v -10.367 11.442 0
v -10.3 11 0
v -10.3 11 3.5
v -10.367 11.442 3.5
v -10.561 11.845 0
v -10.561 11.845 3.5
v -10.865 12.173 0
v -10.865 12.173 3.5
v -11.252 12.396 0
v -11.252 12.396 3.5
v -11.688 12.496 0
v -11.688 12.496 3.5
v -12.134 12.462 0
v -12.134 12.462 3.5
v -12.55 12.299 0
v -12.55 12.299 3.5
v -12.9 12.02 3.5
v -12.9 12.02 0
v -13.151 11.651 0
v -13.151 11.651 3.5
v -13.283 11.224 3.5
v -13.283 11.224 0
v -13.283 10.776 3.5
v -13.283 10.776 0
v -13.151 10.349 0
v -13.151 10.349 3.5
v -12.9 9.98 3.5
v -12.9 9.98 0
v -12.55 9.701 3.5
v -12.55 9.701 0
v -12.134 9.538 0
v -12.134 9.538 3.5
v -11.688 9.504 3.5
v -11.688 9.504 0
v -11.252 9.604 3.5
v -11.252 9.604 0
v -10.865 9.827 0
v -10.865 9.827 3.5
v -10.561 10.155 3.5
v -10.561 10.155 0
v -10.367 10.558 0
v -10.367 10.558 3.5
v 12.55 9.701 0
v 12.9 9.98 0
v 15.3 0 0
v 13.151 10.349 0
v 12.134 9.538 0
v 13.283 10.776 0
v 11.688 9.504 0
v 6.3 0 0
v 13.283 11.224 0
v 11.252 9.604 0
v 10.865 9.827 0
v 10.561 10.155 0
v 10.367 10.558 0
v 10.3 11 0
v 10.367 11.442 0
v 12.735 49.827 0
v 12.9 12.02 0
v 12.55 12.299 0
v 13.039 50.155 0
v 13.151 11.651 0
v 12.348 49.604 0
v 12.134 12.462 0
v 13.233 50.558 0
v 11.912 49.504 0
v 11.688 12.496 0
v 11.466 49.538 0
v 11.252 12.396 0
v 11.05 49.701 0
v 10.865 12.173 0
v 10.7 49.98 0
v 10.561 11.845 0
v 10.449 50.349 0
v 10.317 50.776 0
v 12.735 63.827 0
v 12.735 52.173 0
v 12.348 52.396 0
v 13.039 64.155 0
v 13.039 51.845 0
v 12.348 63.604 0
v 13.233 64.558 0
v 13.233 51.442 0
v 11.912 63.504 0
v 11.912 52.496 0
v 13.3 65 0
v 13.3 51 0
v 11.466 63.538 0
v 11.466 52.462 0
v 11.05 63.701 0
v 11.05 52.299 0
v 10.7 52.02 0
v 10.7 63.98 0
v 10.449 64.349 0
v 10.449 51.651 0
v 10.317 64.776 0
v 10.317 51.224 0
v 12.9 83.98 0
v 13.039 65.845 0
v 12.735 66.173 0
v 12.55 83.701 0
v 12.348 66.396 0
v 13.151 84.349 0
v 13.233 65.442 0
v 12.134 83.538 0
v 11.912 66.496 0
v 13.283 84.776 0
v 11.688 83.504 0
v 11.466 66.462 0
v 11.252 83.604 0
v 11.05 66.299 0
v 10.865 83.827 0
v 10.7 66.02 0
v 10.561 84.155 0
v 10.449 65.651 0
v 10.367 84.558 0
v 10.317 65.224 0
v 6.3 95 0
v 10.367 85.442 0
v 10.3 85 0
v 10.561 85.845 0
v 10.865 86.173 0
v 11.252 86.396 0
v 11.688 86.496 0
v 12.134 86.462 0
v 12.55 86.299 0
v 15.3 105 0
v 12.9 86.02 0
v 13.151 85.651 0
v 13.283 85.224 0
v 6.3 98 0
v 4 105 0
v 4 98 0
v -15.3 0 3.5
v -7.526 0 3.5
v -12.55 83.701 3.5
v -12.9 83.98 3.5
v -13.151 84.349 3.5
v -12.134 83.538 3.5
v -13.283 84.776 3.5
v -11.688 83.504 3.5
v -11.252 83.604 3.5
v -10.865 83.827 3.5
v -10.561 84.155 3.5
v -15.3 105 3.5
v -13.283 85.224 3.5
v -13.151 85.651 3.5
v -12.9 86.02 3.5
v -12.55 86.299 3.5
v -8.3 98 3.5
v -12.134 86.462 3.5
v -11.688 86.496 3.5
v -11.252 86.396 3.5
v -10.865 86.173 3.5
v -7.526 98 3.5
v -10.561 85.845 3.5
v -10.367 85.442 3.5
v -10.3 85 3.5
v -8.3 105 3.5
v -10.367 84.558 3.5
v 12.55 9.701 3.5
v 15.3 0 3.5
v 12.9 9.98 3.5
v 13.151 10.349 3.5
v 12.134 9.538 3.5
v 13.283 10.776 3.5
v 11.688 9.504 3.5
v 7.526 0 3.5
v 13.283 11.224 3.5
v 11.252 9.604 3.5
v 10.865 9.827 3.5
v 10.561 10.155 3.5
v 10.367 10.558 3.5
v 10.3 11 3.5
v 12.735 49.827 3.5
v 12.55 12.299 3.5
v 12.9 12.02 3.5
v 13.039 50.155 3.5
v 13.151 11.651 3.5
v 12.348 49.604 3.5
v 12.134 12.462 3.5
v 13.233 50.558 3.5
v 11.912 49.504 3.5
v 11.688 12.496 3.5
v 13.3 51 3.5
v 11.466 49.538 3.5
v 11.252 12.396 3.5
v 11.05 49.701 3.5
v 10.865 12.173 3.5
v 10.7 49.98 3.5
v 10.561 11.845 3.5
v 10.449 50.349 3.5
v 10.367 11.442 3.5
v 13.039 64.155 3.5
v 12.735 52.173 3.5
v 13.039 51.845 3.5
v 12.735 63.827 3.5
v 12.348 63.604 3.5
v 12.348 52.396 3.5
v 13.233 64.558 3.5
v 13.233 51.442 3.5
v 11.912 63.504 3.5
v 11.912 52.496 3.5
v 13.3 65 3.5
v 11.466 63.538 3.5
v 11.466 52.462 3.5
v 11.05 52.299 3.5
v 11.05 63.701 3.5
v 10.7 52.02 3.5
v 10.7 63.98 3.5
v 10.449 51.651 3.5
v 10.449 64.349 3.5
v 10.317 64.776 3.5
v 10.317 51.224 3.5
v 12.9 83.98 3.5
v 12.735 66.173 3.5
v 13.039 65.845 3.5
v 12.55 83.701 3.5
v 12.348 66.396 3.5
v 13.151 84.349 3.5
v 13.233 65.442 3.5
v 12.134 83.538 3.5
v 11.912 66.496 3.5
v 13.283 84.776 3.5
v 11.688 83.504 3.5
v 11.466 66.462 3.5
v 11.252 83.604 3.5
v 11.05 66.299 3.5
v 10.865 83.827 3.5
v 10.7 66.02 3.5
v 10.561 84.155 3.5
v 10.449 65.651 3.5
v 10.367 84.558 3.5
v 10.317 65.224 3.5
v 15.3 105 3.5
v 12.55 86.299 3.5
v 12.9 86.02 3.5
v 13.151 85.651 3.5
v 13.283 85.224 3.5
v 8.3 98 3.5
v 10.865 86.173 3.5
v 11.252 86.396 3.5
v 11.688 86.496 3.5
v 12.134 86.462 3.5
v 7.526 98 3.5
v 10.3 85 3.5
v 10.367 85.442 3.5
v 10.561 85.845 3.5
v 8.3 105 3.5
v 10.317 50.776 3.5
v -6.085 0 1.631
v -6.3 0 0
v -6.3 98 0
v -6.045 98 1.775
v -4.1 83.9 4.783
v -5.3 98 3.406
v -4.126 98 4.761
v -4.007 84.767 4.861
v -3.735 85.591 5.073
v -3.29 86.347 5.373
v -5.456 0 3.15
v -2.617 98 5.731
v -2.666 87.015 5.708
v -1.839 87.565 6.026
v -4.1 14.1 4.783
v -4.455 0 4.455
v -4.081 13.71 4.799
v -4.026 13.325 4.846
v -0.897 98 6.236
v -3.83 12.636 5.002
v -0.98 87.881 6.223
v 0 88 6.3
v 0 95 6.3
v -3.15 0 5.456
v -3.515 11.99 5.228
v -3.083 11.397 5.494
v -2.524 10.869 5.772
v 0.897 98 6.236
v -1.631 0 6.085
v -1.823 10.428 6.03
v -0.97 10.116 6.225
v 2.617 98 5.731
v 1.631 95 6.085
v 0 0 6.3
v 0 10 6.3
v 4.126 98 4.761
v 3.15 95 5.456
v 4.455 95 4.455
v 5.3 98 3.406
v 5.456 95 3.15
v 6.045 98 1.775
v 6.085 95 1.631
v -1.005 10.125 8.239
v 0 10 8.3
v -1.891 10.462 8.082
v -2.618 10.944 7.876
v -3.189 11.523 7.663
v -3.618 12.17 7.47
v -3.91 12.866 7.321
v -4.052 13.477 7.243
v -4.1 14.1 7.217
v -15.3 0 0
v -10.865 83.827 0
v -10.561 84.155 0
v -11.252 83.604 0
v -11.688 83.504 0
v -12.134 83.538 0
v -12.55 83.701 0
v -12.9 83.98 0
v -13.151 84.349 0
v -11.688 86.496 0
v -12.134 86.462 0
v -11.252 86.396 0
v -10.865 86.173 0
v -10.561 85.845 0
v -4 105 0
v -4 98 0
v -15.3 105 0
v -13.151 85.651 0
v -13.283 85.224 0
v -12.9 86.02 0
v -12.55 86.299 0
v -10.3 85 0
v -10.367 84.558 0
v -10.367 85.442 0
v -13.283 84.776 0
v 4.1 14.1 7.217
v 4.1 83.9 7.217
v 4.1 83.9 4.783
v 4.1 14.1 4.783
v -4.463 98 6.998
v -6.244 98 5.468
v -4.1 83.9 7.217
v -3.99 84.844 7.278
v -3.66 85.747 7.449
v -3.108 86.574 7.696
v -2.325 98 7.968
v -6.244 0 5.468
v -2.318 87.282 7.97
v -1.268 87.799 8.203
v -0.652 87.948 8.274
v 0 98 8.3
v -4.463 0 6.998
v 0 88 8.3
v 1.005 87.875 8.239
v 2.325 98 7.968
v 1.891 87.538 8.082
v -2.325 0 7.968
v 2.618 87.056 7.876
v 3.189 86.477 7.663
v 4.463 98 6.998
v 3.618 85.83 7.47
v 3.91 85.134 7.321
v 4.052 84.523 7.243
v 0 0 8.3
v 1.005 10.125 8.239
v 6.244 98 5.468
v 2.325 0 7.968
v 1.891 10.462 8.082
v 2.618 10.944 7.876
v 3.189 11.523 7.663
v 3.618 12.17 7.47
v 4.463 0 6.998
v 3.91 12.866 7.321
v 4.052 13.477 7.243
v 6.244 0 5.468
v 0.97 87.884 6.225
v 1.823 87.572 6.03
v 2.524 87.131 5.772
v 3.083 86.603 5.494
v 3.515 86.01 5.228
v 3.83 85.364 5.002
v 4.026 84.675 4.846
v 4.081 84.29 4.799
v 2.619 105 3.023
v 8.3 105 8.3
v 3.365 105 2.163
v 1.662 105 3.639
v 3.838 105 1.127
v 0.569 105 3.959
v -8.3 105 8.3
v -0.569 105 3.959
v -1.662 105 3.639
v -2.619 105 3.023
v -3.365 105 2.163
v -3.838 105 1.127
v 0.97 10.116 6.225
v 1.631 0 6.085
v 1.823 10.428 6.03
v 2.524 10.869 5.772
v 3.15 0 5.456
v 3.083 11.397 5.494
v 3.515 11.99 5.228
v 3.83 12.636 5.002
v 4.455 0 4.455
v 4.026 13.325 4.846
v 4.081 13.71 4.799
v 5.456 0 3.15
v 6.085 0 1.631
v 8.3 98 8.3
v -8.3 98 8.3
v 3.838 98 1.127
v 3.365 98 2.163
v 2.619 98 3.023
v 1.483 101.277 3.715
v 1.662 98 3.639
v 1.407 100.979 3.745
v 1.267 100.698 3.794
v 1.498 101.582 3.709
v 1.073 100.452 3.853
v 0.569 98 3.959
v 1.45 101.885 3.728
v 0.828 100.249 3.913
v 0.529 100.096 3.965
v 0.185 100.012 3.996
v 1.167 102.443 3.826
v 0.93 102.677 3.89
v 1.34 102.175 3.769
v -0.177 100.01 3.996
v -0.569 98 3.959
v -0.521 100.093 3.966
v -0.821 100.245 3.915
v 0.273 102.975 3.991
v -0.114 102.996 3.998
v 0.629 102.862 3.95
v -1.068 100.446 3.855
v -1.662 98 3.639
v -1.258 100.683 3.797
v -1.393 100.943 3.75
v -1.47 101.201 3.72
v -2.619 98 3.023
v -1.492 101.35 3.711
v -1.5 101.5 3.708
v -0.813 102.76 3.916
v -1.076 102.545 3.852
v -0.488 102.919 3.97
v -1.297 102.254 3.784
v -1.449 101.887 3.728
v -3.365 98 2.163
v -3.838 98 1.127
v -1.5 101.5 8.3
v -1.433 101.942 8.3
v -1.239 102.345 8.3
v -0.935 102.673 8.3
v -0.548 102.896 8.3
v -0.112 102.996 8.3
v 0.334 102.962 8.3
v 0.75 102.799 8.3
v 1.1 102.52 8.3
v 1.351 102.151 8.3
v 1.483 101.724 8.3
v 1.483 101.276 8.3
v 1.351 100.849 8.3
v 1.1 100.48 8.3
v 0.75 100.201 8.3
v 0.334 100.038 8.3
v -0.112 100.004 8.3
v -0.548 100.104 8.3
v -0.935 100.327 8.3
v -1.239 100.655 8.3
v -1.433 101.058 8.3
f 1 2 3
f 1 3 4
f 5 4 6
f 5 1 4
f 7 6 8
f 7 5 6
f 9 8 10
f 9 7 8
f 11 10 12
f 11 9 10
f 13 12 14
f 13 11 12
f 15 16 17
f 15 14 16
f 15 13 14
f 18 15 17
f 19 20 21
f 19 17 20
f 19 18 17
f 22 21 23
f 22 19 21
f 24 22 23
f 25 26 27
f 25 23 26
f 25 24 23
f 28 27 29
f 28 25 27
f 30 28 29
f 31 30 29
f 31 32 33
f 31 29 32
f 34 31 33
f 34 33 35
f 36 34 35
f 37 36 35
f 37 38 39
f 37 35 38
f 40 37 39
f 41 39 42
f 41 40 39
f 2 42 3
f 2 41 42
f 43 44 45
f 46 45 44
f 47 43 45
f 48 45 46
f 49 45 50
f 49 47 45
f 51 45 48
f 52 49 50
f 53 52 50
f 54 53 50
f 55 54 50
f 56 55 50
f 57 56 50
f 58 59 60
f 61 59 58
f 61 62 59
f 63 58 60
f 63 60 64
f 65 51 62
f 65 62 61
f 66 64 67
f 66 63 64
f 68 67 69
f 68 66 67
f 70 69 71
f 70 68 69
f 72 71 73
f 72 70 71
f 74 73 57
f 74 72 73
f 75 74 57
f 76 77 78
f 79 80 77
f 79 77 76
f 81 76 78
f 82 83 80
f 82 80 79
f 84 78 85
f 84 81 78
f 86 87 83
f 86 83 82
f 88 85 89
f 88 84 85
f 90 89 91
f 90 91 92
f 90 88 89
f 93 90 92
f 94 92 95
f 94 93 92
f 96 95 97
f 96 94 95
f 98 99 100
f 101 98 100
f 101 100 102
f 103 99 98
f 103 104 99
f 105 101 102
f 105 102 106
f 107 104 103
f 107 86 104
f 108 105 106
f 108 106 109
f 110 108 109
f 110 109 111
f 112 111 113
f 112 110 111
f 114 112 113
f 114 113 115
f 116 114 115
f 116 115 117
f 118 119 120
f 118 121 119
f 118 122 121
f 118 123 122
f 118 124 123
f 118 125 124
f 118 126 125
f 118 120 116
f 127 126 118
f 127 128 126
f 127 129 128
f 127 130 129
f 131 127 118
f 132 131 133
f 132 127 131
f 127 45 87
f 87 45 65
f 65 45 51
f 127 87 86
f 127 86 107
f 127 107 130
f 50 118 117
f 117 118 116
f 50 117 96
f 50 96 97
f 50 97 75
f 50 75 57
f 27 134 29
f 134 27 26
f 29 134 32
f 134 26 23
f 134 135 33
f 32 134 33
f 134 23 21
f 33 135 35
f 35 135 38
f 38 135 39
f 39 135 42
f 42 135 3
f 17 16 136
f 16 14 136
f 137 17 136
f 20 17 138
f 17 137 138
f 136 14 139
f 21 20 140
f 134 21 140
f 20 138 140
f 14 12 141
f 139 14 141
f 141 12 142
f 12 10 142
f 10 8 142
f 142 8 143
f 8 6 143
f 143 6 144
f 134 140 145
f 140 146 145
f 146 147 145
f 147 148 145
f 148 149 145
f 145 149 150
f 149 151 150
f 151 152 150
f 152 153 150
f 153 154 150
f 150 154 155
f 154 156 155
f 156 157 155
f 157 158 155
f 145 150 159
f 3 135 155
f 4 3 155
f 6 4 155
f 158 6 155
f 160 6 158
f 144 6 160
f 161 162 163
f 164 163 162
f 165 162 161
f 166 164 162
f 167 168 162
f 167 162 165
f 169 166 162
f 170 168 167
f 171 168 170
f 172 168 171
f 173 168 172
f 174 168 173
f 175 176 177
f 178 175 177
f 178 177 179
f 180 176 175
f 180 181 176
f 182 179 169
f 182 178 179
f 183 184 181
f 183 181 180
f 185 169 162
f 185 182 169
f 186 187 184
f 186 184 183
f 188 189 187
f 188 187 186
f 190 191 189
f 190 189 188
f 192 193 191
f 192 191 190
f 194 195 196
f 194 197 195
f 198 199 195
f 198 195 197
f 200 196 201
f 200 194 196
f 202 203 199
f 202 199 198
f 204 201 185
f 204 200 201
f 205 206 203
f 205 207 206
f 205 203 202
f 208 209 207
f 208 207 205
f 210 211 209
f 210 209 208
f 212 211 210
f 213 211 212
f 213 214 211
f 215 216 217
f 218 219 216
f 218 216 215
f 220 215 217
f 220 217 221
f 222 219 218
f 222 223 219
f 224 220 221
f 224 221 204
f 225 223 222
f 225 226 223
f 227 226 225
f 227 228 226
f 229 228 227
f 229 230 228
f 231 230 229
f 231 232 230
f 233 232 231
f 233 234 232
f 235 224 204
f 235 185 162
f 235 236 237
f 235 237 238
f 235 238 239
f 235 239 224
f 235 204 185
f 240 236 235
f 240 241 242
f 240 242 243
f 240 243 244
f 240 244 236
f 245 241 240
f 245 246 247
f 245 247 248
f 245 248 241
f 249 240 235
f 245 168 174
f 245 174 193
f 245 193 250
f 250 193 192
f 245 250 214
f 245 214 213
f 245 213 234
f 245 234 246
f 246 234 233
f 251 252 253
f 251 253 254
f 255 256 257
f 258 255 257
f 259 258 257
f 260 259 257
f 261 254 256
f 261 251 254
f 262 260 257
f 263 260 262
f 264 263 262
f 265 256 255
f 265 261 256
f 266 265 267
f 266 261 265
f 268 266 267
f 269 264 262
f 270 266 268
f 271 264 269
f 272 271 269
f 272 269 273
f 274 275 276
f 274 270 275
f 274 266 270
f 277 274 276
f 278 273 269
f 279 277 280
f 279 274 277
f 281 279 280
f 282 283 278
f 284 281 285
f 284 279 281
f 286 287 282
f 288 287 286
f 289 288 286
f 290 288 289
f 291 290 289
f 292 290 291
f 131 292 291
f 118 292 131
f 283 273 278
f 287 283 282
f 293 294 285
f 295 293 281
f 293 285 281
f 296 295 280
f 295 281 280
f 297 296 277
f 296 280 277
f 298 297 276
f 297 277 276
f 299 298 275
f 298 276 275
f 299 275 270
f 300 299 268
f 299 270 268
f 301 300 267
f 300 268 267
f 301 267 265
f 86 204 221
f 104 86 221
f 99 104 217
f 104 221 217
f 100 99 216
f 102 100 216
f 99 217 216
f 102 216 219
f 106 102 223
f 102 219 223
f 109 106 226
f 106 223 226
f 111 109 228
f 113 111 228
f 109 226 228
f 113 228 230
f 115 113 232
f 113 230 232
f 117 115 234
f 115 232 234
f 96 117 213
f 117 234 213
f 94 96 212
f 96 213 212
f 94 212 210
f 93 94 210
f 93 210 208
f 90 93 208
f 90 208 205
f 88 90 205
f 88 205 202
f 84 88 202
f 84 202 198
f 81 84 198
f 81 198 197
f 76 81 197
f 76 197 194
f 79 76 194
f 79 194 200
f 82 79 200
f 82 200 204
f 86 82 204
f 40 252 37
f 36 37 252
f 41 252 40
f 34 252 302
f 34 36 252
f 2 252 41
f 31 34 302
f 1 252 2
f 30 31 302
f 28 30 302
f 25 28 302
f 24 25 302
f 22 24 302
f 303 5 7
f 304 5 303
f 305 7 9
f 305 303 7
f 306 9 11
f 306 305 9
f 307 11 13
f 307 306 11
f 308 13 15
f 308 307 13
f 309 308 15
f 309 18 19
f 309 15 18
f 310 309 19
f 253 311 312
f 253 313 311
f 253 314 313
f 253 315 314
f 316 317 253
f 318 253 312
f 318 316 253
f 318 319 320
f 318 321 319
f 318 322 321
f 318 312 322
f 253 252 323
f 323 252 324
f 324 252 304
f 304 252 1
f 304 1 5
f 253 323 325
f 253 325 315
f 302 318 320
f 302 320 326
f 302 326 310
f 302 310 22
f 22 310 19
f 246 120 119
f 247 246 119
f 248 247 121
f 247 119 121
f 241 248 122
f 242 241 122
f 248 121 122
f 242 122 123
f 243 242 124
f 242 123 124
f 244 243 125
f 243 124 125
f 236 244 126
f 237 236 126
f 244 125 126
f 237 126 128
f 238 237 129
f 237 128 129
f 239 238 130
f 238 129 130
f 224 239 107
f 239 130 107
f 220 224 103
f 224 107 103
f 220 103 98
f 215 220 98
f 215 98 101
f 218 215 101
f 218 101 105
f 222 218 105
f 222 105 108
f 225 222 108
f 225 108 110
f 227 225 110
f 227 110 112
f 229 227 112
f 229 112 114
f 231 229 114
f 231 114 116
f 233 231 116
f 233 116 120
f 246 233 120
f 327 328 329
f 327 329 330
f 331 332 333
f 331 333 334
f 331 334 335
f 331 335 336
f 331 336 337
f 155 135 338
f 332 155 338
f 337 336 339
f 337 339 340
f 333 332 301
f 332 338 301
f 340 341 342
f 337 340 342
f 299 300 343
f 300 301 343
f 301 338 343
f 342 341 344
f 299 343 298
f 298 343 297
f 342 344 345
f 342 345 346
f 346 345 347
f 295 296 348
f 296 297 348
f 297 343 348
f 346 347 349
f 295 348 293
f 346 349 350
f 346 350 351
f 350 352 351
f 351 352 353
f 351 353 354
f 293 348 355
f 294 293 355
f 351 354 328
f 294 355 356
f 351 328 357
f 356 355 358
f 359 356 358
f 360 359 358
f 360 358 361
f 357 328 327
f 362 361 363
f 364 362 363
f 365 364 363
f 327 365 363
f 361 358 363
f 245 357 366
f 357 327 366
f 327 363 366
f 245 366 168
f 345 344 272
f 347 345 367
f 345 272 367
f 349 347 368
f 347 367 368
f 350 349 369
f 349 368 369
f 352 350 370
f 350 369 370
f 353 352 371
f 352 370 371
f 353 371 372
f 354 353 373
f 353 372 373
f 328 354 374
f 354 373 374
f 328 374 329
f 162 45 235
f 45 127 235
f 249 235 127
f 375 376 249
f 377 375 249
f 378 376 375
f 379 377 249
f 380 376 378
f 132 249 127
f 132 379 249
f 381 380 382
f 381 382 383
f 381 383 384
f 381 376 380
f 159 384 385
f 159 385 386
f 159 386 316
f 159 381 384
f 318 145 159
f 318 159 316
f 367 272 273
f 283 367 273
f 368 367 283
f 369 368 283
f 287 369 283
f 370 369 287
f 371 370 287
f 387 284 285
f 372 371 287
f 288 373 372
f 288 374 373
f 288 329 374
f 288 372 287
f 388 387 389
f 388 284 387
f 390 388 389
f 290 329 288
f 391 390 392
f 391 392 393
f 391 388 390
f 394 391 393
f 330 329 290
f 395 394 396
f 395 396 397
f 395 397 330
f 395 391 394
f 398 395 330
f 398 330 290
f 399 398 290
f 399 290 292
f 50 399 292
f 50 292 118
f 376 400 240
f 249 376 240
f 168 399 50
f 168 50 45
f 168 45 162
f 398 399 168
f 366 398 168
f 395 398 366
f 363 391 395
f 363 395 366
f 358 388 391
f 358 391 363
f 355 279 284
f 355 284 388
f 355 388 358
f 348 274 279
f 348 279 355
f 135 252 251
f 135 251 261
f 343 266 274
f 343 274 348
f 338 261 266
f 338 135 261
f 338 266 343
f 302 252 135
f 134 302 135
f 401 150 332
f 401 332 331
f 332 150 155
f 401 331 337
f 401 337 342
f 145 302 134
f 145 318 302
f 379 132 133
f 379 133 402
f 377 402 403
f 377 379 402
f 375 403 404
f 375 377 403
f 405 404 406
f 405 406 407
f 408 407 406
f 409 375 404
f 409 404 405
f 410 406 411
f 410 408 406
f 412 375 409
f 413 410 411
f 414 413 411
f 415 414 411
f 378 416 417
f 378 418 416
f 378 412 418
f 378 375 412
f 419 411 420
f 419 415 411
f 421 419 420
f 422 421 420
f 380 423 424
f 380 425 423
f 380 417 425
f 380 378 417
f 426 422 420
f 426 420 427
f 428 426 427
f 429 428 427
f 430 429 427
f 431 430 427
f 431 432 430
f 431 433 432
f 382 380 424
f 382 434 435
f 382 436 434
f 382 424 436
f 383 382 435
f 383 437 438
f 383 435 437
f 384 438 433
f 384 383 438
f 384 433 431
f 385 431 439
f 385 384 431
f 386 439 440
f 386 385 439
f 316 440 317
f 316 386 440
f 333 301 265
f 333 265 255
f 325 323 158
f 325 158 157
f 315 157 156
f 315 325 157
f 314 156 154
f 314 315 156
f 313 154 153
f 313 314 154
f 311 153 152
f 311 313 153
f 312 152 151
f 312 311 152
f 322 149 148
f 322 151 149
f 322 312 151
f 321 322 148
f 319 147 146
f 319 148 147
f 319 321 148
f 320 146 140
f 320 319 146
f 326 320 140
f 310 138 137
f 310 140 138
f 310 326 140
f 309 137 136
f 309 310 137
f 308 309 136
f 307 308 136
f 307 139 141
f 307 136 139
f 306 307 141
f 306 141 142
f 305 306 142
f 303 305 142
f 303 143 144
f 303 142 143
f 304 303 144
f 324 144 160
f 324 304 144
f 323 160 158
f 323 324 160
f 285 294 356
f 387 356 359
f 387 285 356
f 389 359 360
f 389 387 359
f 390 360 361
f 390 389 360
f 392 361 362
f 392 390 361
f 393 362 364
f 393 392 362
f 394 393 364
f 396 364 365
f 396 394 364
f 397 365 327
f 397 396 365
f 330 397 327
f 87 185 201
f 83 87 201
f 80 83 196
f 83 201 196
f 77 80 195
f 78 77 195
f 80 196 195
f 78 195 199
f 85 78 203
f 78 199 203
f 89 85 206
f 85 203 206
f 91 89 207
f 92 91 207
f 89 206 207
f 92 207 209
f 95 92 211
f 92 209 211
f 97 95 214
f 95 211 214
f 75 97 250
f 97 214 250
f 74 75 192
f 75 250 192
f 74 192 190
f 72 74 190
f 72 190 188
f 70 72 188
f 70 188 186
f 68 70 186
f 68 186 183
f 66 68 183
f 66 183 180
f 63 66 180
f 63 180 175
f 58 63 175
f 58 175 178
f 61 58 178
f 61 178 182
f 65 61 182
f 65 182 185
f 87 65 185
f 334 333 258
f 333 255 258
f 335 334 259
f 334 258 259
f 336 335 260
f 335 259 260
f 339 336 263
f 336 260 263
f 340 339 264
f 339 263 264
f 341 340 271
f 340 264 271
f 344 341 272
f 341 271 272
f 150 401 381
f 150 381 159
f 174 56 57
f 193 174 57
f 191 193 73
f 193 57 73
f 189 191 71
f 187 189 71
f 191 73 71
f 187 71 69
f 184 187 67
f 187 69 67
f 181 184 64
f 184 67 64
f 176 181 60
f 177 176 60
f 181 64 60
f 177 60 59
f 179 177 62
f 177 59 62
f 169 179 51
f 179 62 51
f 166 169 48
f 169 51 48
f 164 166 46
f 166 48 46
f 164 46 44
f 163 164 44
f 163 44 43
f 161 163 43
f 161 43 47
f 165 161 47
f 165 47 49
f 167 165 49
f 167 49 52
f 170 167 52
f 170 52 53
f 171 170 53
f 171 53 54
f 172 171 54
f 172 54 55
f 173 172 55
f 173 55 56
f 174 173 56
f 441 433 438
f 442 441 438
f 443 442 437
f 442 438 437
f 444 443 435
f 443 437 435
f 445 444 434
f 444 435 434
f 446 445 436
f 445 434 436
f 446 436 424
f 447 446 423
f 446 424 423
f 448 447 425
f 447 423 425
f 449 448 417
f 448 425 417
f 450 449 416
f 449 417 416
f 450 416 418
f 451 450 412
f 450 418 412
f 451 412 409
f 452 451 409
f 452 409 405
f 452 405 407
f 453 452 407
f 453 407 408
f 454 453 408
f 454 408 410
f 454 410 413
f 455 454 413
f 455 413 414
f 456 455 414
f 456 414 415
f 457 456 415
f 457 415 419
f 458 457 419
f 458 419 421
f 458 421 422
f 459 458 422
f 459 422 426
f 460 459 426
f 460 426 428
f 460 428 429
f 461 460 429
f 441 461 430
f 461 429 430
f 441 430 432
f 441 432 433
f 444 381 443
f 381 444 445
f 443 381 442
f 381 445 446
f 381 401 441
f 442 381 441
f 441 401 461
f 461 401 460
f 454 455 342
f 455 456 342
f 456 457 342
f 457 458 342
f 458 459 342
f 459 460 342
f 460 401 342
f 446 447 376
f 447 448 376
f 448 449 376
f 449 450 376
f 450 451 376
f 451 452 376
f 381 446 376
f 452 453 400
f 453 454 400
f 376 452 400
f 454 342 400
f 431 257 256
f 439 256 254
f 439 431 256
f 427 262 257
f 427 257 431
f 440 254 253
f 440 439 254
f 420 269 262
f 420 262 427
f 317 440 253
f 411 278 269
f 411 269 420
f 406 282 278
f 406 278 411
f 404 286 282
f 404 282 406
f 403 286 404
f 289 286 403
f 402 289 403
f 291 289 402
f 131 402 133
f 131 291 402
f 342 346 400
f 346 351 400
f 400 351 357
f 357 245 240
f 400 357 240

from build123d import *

# Parameters (mm, degrees)
SKETCH1_R                = 8.3
SKETCH1_R_2              = 6.3
BOSS_EXTRUDE1_DEPTH      = 95
SKETCH3_R                = 8.3
BOSS_EXTRUDE2_DEPTH      = 3
SKETCH5_W                = 16.6
SKETCH5_H                = 16.6
BOSS_EXTRUDE4_DEPTH      = 7
CUT_EXTRUDE1_DEPTH       = 107.627623063
FILLET1_R                = 4.1
SKETCH4_R                = 6.3
SKETCH4_R_2              = 1.5
CUT_EXTRUDE3_DEPTH       = 3
BOSS_EXTRUDE6_START      = 2
SKETCH8_R                = 1.5
BOSS_EXTRUDE6_DEPTH      = 2
BOSS_EXTRUDE7_START      = -0.774045
BOSS_EXTRUDE7_DEPTH      = 7.774045
F_3_0_3_DIAMETER_HOLE1_D = 3
F_3_0_3_DIAMETER_HOLE2_D = 3
F_3_0_3_DIAMETER_HOLE3_D = 3
CUT_EXTRUDE4_START       = -105
CUT_EXTRUDE4_DEPTH       = 105


# Read off the part's stored shape, not the designer's step: Cut-Extrude4
with BuildPart() as part:
    # Sketch1 → Boss-Extrude1 (new body)
    with BuildSketch(Plane(origin=(0, 0, 0), x_dir=(1, 0, 0), z_dir=(0, 1, 0))):
        with Locations(Location((0, 0, 0), (0, 0, 270))):
            Circle(SKETCH1_R)
        with Locations(Location((0, 0, 0), (0, 0, 270))):
            Circle(SKETCH1_R_2, mode=Mode.SUBTRACT)
    extrude(amount=BOSS_EXTRUDE1_DEPTH)

    # Sketch3 → Boss-Extrude2 (add)
    with BuildSketch(Plane(origin=(0, 95, 0), x_dir=(1, 0, 0), z_dir=(0, 1, 0))):
        with Locations(Location((0, 0, 0), (0, 0, 270))):
            Circle(SKETCH3_R)
    extrude(amount=BOSS_EXTRUDE2_DEPTH)

    # Sketch5 → Boss-Extrude4 (add)
    with BuildSketch(Plane(origin=(0, 98, 0), x_dir=(1, 0, 0), z_dir=(0, 1, 0))):
        Rectangle(SKETCH5_W, SKETCH5_H)
    extrude(amount=BOSS_EXTRUDE4_DEPTH)

    # Sketch6 → Cut-Extrude1 (cut, through all)
    with BuildSketch(Plane.XY.offset(8.3)):
        Polygon((4.1, 10), (0, 10), (-4.1, 10), (-4.1, 88), (4.1, 88), align=None)
    extrude(amount=-CUT_EXTRUDE1_DEPTH, mode=Mode.SUBTRACT)

    # Fillet1
    fillet1_edges = [part.edges().sort_by_distance(p)[0] for p in [
        (4.1, 88, 5.999975859),
        (4.1, 88, -5.999975859),
        (-4.1, 88, 5.999975859),
        (-4.1, 88, -5.999975859),
        (4.1, 10, -5.999975859),
        (4.1, 10, 5.999975859),
        (-4.1, 10, -5.999975859),
        (-4.1, 10, 5.999975859),
    ]]
    fillet(fillet1_edges, radius=FILLET1_R - 0.0001)  # a hair under: the kernel refuses the full size

    # Sketch4 → Cut-Extrude3 (cut)
    with BuildSketch(Plane(origin=(0, 95, 0), x_dir=(-1, 0, 0), z_dir=(0, -1, 0))):
        with Locations(Location((0, 0, 0), (0, 0, 90))):
            Circle(SKETCH4_R)
        with Locations(Location((0, 0, 0), (0, 0, 90))):
            Circle(SKETCH4_R_2, mode=Mode.SUBTRACT)
    extrude(amount=-CUT_EXTRUDE3_DEPTH, mode=Mode.SUBTRACT)

    # Sketch8 → Boss-Extrude6 (add)
    with BuildSketch(Plane(origin=(0, 95, 0), x_dir=(-1, 0, 0), z_dir=(0, -1, 0)).offset(BOSS_EXTRUDE6_START)):
        with Locations(Location((0, 0, 0), (0, 0, 90))):
            Circle(SKETCH8_R)
    extrude(amount=-BOSS_EXTRUDE6_DEPTH)

    # Sketch9 → Boss-Extrude7 (add)
    with BuildSketch(Plane.ZY.offset(8.3).offset(BOSS_EXTRUDE7_START)):
        Polygon((0, 0), (3.5, 0), (3.5, 105), (-3.5, 105), (-3.5, 0), align=None)
    boss_extrude7 = extrude(amount=BOSS_EXTRUDE7_DEPTH)

    # Mirror1: Boss-Extrude7 across plane
    add(boss_extrude7.mirror(Plane(origin=(0, 0, 0), x_dir=(0, 0, 1), z_dir=(1, 0, 0))))

    # Ø3.0 (3) Diameter Hole1 (through all)
    with Locations(Plane.XY.offset(8.3)):
        with Locations((0, 101.5)):
            Hole(F_3_0_3_DIAMETER_HOLE1_D / 2)

    # Ø3.0 (3) Diameter Hole2 (through all)
    with Locations(Plane.XY.offset(3.5)):
        with Locations((11.8, 85), (11.8, 11)):
            f_3_0_3_diameter_hole2 = Hole(F_3_0_3_DIAMETER_HOLE2_D / 2)

    # Ø3.0 (3) Diameter Hole3 (through all)
    with Locations(Plane(origin=(0, 0, -3.5), x_dir=(-1, 0, 0), z_dir=(0, 0, -1))):
        with Locations((-11.8, 65), (-11.8, 51)):
            Hole(F_3_0_3_DIAMETER_HOLE3_D / 2)

    # Mirror2: Ø3.0 (3) Diameter Hole2 across plane
    add(f_3_0_3_diameter_hole2.mirror(Plane(origin=(0, 0, 0), x_dir=(0, 0, 1), z_dir=(1, 0, 0))), mode=Mode.SUBTRACT)

    # Cut-Extrude4 outline → Cut-Extrude4 (cut)
    with BuildSketch(Plane(origin=(0, 0, 0), x_dir=(-1, 0, 0), z_dir=(0, -1, 0)).offset(CUT_EXTRUDE4_START)):
        with BuildLine():
            ThreePointArc((-4, 0), (0, -4), (4, 0))
            Line((4, 0), (15.3, 0))
            Line((15.3, 0), (15.3, 3.5))
            Line((15.3, 3.5), (8.3, 3.5))
            Line((8.3, 3.5), (8.3, 8.3))
            Line((8.3, 8.3), (-8.3, 8.3))
            Line((-8.3, 8.3), (-8.3, 3.5))
            Line((-8.3, 3.5), (-15.3, 3.5))
            Line((-15.3, 3.5), (-15.3, 0))
            Line((-15.3, 0), (-4, 0))
        make_face()
    extrude(amount=CUT_EXTRUDE4_DEPTH, mode=Mode.SUBTRACT)


solid = part.part
